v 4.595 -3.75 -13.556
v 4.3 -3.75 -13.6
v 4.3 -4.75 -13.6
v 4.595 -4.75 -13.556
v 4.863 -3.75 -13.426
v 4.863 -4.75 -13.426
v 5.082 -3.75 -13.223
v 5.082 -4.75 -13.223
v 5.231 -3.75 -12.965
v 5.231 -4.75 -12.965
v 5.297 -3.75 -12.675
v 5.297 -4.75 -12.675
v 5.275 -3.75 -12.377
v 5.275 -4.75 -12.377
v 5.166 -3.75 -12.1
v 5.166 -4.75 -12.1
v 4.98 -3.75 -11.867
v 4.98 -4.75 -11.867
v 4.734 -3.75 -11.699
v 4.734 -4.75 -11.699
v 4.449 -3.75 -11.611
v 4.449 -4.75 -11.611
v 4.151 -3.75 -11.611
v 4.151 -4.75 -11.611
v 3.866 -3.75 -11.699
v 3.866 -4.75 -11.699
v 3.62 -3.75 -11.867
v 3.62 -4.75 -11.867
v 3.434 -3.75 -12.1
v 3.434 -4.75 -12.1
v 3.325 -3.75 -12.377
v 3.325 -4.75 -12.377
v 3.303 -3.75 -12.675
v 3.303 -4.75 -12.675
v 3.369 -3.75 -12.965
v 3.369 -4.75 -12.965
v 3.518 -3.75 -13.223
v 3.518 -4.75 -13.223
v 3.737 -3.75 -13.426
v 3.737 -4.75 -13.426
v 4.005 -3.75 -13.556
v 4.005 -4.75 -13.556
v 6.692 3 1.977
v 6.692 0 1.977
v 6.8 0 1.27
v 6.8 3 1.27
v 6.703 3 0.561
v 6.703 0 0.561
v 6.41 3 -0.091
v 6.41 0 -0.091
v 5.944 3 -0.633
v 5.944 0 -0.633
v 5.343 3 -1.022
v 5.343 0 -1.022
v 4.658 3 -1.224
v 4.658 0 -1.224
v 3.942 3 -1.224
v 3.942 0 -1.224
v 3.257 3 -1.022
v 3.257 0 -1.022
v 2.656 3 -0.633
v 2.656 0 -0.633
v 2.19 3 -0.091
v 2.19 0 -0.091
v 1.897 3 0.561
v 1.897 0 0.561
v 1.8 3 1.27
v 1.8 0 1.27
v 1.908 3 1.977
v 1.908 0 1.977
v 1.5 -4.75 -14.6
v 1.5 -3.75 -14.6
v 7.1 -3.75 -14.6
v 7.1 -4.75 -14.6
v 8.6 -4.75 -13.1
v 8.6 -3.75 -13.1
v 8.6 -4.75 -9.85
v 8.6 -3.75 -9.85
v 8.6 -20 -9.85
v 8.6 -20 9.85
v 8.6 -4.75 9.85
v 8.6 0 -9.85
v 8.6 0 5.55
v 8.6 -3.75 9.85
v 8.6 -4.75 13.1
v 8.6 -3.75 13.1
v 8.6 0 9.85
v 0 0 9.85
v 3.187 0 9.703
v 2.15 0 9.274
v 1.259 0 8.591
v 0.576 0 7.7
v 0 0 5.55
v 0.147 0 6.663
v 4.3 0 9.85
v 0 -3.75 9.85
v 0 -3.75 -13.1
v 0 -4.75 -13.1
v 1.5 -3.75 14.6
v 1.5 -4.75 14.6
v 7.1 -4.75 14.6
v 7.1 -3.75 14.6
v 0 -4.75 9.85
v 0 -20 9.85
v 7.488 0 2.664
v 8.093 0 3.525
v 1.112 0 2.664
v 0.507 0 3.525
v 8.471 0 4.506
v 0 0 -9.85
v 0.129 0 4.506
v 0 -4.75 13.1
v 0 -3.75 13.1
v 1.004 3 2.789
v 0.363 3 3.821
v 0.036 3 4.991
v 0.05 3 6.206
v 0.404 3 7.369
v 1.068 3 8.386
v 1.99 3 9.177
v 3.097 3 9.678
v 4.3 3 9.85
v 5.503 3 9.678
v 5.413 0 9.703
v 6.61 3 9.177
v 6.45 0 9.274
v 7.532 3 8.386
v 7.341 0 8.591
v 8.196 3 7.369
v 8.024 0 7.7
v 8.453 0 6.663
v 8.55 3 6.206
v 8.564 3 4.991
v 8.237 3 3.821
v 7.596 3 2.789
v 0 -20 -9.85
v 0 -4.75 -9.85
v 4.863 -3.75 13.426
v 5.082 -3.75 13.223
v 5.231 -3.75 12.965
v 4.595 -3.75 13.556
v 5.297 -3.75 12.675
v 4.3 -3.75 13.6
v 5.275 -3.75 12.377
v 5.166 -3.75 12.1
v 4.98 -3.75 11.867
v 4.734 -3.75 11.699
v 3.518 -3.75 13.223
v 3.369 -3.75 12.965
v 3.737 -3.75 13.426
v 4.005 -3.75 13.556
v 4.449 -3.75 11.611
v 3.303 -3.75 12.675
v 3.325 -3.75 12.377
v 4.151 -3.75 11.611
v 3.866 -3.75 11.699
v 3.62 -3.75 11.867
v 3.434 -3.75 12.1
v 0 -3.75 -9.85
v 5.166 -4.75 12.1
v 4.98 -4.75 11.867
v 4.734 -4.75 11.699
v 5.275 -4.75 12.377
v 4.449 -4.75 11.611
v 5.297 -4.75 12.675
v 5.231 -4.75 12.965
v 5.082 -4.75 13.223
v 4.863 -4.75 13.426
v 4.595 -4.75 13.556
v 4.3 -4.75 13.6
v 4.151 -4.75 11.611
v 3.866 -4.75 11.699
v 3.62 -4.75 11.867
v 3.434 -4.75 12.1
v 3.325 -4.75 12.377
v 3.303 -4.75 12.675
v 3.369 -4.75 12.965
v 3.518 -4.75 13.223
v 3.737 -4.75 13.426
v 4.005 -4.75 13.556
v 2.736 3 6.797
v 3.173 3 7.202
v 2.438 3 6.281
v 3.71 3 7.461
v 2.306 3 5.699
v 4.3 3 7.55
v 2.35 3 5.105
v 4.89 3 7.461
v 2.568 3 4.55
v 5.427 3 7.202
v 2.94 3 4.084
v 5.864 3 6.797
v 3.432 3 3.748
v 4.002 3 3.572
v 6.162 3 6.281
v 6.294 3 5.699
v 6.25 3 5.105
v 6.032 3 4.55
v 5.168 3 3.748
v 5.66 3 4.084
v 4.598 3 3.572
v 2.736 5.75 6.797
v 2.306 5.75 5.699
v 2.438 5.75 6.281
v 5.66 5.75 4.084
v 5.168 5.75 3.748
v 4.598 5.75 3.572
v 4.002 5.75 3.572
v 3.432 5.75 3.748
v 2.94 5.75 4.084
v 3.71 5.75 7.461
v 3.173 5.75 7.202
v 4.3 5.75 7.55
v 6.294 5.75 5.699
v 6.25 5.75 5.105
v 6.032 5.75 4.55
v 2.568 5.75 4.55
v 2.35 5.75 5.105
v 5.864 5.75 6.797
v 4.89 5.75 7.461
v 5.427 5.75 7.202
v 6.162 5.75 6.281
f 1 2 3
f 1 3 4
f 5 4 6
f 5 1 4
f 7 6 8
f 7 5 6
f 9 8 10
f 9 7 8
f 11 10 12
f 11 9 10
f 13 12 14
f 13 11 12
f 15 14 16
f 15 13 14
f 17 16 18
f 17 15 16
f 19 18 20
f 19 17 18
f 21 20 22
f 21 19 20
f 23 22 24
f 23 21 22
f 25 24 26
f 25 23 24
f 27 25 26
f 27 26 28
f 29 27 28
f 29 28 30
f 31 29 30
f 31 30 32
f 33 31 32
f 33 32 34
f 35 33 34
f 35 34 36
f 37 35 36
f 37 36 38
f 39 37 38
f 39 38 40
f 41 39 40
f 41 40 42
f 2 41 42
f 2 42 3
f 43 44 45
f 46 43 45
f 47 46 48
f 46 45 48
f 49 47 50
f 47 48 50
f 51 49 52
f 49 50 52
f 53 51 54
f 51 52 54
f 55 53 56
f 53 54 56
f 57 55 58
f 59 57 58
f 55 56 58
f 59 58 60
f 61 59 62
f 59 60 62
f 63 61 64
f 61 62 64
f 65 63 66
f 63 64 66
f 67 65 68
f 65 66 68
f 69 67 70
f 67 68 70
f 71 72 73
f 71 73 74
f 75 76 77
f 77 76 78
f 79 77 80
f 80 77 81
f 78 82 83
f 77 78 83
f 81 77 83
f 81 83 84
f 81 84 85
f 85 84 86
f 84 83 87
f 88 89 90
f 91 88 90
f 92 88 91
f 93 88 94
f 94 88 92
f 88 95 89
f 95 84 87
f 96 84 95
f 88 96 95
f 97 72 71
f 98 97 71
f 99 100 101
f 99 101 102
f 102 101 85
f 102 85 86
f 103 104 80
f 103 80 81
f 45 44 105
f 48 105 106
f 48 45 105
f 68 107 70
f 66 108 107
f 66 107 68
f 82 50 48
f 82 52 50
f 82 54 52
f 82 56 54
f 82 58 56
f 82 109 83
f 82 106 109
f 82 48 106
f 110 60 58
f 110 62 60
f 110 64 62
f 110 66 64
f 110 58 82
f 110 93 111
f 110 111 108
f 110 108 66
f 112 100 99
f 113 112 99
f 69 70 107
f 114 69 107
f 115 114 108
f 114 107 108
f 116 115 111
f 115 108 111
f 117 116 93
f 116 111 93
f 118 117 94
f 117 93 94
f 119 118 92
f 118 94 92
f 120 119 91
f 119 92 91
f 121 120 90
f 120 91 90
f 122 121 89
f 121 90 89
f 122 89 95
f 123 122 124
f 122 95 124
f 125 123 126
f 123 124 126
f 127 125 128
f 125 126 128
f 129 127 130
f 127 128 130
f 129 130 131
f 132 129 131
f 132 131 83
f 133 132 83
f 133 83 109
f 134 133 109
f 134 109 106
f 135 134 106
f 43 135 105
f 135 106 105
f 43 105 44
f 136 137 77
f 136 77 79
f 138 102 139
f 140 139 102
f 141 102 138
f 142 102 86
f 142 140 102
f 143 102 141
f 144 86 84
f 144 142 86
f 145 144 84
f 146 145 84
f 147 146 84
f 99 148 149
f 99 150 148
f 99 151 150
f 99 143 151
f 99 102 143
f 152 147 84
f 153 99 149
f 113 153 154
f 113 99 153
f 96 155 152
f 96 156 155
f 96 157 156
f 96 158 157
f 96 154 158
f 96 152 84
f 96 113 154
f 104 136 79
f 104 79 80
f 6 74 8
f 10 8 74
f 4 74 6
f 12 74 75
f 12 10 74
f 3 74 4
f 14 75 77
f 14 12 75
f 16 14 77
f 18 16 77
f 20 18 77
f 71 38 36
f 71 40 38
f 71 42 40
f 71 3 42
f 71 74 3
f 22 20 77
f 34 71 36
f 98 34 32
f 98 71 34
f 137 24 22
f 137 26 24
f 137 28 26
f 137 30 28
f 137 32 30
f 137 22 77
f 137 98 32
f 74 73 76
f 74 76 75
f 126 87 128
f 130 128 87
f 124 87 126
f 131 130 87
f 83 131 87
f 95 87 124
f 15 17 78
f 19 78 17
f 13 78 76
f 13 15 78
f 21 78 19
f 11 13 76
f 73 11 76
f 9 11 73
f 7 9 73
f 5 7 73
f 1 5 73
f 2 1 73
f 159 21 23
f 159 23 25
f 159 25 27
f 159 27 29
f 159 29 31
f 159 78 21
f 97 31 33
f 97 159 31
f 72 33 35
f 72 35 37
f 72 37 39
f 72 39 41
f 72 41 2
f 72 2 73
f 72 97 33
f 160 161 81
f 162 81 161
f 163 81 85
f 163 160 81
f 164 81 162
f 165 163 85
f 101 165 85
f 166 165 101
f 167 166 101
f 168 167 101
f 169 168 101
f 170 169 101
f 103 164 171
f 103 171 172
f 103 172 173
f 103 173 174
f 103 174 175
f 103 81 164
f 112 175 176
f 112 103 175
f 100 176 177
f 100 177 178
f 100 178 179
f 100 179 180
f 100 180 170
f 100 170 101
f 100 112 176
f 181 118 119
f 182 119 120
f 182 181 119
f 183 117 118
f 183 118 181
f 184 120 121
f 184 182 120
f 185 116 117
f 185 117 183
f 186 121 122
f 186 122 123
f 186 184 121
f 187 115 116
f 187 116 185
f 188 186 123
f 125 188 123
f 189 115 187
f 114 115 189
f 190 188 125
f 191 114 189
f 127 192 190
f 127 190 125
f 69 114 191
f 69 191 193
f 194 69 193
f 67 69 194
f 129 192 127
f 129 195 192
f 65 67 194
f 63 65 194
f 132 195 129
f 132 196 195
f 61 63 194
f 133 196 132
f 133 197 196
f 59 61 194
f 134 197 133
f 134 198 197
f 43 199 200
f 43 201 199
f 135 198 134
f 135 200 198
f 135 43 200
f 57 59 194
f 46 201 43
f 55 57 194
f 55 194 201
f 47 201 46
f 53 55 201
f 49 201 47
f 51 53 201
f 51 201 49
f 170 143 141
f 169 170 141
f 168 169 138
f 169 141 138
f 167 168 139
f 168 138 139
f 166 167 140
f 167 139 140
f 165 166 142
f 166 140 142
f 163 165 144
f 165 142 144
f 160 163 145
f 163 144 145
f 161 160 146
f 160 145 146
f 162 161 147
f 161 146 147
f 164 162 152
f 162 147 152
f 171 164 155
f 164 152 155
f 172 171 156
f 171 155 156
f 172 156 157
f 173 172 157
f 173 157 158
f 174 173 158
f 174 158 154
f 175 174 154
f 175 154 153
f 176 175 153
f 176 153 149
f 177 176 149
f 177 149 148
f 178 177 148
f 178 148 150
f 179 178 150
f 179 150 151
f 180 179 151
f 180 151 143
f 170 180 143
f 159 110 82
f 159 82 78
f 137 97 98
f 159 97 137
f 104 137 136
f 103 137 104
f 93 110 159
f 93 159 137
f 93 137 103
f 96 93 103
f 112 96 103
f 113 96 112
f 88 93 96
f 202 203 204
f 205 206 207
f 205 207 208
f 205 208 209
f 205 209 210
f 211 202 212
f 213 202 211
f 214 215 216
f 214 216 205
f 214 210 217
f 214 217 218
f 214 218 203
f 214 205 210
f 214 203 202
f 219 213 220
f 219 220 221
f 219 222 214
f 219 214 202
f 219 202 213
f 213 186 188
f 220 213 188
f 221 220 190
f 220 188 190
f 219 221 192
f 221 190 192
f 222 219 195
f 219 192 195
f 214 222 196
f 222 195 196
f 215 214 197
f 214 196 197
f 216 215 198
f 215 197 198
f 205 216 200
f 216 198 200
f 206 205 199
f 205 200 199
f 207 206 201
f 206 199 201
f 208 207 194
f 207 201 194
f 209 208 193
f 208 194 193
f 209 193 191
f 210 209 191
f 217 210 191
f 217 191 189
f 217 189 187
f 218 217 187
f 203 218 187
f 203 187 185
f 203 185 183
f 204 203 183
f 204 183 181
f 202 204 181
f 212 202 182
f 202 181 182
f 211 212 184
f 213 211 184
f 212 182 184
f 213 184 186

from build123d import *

# Parameters (mm, degrees)
BOSS_EXTRUDE1_DEPTH = 8.6
BOSS_EXTRUDE2_DEPTH = 3
SKETCH3_R           = 2
BOSS_EXTRUDE3_DEPTH = 2.75
CUT_EXTRUDE1_REACH  = 25.477
SKETCH4_R           = 1
CHAMFER1_SIZE       = 1.5


with BuildPart() as part:
    # Sketch1 → Boss-Extrude1 (new body)
    with BuildSketch(Plane(origin=(0, 0, 0), x_dir=(0, 0, -1), z_dir=(1, 0, 0))):
        Polygon((9.85, -3.75), (14.6, -3.75), (14.6, -4.75), (9.85, -4.75), (9.85, -20), (-9.85, -20), (-9.85, -4.75), (-14.6, -4.75), (-14.6, -3.75), (-9.85, -3.75), (-9.85, 0), (9.85, 0), align=None)
    extrude(amount=BOSS_EXTRUDE1_DEPTH)

    # Sketch2 → Boss-Extrude2 (add)
    with BuildSketch(Plane(origin=(0, 0, 0), x_dir=(1, 0, 0), z_dir=(0, 1, 0))):
        with BuildLine():
            ThreePointArc((1.907962607, -1.976744186), (4.3, -9.85), (6.692037393, -1.976744186))
            ThreePointArc((6.692037393, -1.976744186), (4.3, 1.25), (1.907962607, -1.976744186))
        make_face()
    extrude(amount=BOSS_EXTRUDE2_DEPTH)

    # Sketch3 → Boss-Extrude3 (add)
    with BuildSketch(Plane(origin=(0, 3, 0), x_dir=(1, 0, 0), z_dir=(0, 1, 0))):
        with Locations(Location((4.3, -5.55, 0), (0, 0, 270))):
            Circle(SKETCH3_R)
    extrude(amount=BOSS_EXTRUDE3_DEPTH)

    # Sketch4 → Cut-Extrude1 (cut, up to next)
    with BuildSketch(Plane(origin=(0, -3.75, 0), x_dir=(1, 0, 0), z_dir=(0, 1, 0)), mode=Mode.PRIVATE) as cut_extrude1_sk1:
        with Locations(Location((4.3, -12.6, 0), (0, 0, 270))):
            Circle(SKETCH4_R)
    cut_extrude1_tool1 = extrude(cut_extrude1_sk1.sketch, amount=-CUT_EXTRUDE1_REACH, mode=Mode.PRIVATE) & part.part
    cut_extrude1 = cut_extrude1_tool1.solids().sort_by_distance((4.3, -3.75, 12.6))[0]
    add(cut_extrude1, mode=Mode.SUBTRACT)

    # Mirror1: Cut-Extrude1 across plane
    add(cut_extrude1.mirror(Plane.XY), mode=Mode.SUBTRACT)

    # Chamfer1
    chamfer1_edges = [part.edges().sort_by_distance(p)[0] for p in [
        (8.6, -4.25, 14.6),
        (0, -4.25, -14.6),
        (0, -4.25, 14.6),
        (8.6, -4.25, -14.6),
    ]]
    chamfer(chamfer1_edges, length=CHAMFER1_SIZE)


solid = part.part
